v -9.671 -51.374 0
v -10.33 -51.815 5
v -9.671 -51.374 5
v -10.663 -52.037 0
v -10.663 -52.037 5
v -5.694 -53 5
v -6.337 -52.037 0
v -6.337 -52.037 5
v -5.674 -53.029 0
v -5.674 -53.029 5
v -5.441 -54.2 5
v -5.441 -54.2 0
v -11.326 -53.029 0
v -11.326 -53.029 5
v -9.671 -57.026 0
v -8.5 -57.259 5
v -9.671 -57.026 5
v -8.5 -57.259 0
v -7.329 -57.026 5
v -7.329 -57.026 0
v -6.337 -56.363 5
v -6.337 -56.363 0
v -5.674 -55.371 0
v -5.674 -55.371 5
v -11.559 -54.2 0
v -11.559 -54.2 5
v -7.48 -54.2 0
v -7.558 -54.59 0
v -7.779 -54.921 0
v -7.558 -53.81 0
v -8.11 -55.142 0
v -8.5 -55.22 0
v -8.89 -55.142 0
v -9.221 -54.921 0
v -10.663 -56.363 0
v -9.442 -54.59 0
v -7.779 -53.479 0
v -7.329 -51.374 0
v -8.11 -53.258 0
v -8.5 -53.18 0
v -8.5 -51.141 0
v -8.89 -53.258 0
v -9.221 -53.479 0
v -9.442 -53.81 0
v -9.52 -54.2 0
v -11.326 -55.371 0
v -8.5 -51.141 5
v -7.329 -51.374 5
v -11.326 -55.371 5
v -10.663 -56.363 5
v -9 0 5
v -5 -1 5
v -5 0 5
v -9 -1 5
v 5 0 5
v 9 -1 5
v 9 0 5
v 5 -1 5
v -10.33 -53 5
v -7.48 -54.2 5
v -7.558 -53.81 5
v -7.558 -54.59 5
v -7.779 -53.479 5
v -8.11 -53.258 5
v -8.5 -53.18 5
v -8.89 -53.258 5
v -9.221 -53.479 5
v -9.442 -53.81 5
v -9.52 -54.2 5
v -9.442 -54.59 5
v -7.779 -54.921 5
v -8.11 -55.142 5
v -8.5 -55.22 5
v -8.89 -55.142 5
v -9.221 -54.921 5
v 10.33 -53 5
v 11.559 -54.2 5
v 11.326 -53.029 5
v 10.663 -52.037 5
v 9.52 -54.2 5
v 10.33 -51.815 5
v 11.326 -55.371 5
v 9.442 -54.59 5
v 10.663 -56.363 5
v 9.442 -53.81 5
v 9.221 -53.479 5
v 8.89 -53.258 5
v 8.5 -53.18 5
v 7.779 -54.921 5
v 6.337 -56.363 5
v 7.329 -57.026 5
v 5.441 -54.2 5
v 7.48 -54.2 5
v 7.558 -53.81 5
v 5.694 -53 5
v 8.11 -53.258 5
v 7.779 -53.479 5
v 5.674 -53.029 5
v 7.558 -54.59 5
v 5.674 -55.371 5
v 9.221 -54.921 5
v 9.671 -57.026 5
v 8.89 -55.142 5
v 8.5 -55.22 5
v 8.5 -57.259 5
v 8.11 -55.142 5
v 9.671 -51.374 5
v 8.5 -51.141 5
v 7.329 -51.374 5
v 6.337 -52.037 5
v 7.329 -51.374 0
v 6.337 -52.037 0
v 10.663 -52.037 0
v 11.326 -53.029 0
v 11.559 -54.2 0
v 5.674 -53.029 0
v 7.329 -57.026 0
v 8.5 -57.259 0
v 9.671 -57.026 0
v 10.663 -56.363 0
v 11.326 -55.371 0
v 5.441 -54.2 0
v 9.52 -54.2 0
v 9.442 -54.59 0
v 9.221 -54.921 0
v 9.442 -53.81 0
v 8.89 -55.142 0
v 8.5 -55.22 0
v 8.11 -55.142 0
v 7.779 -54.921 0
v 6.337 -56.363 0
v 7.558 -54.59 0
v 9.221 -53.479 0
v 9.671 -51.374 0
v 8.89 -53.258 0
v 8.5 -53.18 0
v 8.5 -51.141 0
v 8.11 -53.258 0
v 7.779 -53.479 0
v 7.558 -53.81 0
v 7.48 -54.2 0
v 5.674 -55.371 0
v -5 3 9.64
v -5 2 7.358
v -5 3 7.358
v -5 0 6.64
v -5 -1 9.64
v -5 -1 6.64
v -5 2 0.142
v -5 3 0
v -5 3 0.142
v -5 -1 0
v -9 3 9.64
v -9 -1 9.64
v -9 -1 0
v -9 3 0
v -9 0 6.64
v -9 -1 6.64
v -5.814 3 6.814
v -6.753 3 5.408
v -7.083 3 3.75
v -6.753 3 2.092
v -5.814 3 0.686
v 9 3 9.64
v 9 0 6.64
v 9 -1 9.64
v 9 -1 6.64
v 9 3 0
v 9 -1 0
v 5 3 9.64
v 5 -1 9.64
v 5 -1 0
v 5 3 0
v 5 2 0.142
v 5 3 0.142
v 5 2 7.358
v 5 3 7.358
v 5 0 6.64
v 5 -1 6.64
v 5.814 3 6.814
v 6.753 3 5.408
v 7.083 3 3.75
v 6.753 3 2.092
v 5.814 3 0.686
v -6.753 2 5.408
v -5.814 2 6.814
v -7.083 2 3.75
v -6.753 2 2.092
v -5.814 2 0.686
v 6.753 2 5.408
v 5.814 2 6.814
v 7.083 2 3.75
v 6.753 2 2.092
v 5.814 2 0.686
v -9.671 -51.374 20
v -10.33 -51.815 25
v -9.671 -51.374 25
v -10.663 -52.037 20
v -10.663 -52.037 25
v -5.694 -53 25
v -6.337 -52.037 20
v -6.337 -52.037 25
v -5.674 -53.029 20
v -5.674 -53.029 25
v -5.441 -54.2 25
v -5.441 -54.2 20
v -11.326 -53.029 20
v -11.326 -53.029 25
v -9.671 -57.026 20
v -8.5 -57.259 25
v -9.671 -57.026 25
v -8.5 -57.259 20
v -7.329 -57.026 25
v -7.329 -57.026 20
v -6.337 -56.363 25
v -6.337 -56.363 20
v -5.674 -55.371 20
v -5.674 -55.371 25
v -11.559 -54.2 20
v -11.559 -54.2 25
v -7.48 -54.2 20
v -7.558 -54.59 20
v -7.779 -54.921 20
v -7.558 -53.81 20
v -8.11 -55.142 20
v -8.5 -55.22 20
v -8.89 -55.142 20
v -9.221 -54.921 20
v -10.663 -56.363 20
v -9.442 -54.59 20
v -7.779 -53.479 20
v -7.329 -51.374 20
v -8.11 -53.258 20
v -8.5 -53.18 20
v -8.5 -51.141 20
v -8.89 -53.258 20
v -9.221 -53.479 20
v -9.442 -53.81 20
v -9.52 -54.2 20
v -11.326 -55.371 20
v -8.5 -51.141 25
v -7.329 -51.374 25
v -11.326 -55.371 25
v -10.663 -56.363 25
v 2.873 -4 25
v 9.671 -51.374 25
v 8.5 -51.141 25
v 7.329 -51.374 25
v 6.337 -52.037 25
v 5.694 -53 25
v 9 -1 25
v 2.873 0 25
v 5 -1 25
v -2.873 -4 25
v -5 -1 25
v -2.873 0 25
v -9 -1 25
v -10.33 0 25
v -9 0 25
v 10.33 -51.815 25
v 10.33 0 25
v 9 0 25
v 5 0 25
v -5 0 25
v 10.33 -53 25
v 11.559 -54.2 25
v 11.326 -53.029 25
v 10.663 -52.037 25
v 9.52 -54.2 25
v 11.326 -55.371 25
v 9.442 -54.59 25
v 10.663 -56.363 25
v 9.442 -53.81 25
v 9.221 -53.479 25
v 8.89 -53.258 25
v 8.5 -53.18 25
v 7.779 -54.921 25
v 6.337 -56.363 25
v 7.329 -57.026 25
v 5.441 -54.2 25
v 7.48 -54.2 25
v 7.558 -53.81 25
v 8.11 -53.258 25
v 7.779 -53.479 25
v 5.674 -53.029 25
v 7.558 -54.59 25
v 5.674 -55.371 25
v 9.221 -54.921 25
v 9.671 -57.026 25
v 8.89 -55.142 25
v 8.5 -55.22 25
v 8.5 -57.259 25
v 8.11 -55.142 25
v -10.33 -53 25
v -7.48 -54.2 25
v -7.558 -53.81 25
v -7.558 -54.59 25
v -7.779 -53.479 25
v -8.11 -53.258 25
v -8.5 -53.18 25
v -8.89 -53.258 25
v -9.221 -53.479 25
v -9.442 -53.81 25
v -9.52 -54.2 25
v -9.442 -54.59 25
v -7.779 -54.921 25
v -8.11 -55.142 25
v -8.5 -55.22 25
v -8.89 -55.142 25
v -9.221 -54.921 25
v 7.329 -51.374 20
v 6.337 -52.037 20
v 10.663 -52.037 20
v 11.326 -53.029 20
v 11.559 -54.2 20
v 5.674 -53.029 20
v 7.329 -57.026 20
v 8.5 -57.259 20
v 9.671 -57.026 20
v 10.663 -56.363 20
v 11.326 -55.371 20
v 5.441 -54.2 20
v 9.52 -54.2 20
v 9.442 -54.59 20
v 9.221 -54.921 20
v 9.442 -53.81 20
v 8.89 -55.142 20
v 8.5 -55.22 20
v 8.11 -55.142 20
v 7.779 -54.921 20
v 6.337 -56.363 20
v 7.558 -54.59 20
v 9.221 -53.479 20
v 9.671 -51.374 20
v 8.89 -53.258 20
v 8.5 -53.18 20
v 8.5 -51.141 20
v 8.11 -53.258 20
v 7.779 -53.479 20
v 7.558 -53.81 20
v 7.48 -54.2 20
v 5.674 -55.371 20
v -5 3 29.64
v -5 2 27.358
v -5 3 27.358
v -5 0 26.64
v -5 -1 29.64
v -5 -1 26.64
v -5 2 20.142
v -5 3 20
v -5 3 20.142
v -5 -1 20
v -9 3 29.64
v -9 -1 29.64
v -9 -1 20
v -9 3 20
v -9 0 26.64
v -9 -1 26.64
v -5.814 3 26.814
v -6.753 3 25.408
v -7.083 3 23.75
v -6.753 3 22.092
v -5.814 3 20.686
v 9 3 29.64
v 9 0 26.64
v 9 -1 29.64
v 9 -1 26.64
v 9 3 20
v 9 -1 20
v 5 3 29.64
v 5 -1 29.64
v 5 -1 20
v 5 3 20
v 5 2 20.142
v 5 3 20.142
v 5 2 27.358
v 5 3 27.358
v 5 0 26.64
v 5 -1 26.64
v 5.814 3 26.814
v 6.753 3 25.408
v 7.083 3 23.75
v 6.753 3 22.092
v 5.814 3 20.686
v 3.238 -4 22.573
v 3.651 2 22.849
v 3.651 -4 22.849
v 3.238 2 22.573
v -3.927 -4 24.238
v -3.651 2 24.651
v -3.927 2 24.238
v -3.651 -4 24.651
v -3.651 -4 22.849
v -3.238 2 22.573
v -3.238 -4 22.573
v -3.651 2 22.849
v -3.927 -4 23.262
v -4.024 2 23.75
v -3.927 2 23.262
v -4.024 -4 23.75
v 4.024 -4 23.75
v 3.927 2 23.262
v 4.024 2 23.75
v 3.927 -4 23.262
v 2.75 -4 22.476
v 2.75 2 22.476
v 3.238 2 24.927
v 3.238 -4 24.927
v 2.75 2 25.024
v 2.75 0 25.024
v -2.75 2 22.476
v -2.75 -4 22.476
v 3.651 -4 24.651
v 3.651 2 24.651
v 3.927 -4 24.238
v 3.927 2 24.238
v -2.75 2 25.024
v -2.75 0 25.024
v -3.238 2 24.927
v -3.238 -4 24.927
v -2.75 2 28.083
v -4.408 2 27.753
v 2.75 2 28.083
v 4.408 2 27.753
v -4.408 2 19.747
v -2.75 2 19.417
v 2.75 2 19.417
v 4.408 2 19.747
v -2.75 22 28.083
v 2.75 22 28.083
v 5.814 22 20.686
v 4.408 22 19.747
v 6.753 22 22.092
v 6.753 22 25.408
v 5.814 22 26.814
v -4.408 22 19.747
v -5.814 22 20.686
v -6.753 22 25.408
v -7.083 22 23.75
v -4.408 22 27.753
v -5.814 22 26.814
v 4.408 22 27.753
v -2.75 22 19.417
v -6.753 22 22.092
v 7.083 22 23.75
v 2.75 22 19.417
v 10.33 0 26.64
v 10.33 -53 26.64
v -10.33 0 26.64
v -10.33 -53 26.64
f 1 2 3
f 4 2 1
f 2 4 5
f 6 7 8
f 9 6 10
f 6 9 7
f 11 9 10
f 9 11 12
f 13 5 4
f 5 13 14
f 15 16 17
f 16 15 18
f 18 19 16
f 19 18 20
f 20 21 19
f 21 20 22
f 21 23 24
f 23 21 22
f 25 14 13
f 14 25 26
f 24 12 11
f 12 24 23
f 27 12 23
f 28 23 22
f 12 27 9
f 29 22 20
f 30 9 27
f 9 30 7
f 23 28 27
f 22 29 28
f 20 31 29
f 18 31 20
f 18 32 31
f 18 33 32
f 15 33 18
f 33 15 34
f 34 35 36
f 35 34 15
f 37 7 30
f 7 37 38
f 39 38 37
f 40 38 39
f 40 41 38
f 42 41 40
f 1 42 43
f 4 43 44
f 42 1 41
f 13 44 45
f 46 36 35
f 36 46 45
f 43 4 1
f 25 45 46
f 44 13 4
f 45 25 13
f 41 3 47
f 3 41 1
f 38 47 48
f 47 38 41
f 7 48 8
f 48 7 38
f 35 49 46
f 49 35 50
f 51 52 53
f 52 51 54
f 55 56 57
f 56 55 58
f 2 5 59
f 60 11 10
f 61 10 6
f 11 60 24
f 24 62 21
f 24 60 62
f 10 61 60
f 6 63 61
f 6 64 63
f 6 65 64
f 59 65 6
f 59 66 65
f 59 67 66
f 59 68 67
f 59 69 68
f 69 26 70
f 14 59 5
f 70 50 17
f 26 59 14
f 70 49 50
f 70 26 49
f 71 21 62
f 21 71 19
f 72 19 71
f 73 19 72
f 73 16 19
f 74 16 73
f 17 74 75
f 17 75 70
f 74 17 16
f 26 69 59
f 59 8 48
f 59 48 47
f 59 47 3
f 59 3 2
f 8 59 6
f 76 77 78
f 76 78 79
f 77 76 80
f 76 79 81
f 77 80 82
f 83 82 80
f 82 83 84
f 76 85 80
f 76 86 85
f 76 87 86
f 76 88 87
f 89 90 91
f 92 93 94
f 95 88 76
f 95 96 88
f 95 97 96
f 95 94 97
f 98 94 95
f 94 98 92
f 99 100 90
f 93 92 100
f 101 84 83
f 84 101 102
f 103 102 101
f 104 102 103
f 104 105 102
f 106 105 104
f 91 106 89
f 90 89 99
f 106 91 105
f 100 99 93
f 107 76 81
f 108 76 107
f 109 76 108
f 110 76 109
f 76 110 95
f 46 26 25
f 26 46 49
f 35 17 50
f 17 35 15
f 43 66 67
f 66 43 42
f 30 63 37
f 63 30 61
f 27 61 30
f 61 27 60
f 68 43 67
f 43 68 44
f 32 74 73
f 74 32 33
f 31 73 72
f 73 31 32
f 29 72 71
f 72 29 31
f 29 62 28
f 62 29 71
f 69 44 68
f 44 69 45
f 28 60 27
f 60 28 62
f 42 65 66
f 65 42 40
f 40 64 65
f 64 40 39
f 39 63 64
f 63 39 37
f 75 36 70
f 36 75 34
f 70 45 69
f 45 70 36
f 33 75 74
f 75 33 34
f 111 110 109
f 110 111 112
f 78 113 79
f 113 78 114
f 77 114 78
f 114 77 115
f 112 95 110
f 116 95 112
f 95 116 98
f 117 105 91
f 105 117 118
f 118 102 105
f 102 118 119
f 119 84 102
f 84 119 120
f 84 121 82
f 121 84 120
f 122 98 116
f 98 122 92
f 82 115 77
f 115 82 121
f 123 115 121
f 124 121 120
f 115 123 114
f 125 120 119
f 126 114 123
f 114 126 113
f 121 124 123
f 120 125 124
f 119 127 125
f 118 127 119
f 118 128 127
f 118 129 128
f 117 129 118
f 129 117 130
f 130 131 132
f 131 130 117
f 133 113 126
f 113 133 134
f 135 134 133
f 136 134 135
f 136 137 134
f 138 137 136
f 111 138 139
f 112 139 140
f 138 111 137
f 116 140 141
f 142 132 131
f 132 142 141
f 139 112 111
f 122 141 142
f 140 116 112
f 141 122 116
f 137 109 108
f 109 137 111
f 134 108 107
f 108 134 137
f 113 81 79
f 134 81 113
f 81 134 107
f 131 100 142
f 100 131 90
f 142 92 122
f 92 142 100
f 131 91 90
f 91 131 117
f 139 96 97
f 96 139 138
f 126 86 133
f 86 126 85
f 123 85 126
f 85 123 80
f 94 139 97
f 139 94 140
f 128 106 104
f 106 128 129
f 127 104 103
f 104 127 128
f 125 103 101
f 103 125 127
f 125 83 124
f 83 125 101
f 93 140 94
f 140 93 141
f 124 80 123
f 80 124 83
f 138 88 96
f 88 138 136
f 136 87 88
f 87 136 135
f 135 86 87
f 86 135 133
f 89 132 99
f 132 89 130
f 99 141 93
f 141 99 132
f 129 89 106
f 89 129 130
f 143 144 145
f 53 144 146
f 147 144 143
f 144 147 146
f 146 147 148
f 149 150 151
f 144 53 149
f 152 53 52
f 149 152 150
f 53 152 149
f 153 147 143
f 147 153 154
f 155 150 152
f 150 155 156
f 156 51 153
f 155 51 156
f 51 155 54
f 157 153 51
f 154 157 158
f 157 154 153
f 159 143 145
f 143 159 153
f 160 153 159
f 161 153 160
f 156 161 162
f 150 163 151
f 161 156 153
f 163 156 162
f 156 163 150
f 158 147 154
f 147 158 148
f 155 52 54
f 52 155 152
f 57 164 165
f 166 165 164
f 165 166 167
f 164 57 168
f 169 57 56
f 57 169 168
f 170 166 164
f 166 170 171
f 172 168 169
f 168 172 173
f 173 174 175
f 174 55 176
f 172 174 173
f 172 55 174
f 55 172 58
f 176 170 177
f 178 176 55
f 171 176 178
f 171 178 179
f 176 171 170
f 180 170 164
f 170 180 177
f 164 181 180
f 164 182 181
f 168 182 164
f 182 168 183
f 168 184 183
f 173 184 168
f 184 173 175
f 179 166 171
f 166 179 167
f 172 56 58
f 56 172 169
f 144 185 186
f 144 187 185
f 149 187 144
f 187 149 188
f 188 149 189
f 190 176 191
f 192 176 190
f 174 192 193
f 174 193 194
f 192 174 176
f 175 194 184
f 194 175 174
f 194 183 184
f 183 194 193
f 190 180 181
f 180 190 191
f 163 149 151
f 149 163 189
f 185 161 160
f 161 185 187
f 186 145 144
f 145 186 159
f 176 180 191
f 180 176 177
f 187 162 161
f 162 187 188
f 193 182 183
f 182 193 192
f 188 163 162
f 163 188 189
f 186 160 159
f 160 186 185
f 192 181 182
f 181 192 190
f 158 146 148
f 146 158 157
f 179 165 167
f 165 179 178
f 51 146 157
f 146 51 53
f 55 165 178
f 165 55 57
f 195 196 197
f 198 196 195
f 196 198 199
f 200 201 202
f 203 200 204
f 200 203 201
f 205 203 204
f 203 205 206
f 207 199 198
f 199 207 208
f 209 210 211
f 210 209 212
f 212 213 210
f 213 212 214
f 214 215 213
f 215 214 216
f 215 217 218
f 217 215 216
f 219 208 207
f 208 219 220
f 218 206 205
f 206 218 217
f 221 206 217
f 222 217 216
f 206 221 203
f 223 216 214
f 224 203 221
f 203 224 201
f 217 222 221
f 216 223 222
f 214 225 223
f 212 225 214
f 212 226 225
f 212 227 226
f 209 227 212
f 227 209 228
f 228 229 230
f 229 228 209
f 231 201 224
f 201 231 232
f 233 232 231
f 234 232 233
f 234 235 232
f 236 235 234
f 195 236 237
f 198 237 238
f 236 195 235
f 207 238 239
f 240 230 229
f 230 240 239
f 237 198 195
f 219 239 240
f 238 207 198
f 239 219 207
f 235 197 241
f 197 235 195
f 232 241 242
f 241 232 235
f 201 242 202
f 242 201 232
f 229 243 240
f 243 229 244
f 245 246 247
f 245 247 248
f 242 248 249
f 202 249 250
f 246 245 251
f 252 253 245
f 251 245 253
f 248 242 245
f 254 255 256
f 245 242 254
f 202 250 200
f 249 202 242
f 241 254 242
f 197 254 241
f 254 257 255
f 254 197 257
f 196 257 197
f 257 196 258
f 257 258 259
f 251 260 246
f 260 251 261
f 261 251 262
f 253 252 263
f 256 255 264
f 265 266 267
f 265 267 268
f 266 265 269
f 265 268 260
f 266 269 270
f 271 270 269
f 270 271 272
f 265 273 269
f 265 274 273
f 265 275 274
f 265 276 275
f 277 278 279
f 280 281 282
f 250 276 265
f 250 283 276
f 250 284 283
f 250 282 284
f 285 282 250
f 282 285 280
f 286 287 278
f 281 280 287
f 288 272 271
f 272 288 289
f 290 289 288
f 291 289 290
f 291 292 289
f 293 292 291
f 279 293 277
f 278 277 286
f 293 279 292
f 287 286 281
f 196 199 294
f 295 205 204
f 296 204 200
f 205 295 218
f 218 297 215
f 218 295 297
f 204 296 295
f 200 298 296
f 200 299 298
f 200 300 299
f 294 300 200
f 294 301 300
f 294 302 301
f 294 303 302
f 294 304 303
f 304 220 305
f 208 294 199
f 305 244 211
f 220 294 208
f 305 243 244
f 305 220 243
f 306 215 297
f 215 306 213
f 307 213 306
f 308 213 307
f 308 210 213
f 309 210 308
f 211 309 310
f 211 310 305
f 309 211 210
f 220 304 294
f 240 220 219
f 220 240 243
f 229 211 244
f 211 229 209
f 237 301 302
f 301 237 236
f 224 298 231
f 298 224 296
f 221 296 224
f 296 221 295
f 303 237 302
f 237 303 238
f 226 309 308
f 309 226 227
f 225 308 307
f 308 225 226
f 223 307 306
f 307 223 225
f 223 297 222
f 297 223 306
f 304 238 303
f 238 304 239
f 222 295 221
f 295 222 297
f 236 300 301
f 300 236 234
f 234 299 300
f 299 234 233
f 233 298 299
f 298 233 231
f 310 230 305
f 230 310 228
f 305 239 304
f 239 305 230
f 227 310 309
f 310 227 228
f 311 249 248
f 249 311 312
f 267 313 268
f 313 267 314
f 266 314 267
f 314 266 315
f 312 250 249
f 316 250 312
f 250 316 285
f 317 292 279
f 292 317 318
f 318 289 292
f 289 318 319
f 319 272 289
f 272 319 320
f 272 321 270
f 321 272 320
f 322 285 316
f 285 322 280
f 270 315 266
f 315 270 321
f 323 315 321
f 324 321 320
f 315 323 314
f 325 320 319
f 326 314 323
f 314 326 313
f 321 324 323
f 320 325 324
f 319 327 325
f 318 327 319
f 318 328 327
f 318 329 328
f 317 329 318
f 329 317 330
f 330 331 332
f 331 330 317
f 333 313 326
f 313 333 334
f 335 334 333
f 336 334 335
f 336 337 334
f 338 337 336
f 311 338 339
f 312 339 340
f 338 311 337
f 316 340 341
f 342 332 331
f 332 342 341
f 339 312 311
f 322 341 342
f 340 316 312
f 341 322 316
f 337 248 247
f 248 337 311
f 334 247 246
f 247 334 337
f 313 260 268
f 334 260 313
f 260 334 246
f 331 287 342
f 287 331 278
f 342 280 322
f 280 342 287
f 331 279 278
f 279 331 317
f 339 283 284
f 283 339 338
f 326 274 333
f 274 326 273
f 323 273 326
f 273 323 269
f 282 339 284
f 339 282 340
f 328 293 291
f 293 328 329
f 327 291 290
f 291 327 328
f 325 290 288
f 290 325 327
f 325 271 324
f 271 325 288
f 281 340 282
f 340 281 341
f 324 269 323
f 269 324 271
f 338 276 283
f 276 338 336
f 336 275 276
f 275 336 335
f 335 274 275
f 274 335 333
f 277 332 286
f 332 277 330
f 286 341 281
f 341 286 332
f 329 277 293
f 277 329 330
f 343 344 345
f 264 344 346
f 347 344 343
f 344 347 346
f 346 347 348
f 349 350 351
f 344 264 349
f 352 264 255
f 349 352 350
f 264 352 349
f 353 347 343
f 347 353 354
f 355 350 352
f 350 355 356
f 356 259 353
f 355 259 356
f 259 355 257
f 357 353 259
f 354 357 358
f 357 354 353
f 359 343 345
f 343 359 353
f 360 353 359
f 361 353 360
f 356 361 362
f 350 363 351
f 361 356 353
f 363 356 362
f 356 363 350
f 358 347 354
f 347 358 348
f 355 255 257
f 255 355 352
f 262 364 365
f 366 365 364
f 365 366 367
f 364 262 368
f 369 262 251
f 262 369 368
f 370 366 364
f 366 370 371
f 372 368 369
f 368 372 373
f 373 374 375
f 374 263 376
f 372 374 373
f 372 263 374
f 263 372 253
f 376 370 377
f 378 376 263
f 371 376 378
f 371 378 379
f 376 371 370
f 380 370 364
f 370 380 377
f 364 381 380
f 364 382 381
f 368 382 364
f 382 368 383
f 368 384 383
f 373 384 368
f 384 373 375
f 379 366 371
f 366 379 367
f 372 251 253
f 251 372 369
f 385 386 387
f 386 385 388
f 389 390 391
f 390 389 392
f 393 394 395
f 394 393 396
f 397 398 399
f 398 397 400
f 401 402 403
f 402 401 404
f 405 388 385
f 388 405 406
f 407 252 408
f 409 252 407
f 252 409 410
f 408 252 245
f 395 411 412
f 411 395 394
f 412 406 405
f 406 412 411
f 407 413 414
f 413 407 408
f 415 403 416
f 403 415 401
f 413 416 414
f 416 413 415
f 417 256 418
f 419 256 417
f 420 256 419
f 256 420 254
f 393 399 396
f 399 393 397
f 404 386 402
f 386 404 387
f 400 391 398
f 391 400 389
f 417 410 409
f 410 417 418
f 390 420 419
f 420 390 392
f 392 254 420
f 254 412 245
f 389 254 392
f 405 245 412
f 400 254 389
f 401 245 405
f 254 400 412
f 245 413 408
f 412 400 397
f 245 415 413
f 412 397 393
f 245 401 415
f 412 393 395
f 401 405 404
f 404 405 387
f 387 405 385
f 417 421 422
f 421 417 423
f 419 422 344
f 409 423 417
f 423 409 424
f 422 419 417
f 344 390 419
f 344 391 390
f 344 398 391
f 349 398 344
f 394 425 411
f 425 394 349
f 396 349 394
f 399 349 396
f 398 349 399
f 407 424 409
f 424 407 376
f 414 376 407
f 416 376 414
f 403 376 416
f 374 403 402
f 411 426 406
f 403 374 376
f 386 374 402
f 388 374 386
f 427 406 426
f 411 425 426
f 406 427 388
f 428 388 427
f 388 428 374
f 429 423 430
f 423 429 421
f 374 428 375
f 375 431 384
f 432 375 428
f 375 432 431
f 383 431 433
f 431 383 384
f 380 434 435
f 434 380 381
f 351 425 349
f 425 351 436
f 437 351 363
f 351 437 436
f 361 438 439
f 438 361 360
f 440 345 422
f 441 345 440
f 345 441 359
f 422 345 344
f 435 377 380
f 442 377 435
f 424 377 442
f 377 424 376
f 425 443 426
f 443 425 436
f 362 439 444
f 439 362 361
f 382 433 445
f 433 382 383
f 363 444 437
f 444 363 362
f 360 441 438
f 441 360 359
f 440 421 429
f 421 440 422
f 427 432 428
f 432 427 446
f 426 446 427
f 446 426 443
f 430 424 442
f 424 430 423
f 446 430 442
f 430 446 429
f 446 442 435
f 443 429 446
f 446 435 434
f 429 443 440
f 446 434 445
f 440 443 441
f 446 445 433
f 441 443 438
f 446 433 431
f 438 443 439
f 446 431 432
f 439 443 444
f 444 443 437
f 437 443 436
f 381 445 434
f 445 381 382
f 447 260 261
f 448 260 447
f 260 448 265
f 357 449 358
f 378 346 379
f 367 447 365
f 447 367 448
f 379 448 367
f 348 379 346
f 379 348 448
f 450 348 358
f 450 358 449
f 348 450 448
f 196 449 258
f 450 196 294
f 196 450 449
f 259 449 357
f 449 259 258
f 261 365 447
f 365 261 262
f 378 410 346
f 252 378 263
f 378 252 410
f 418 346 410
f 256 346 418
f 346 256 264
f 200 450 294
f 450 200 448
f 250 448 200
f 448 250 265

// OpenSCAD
union() {
	color(alpha = 1.0, c = [0.2, 0.2, 0.2]) {
		difference() {
			union() {
				translate(v = [0, -54.2, 0]) {
					union() {
						translate(v = [-8.5, 0, 0]) {
							difference() {
								cylinder($fn = 16, center = false, h = 5, r = 3.058773474624955);
								translate(v = [0, 0, -0.05]) {
									cylinder($fn = 16, center = false, h = 5.1, r = 1.0195911582083184);
								}
							}
						}
						translate(v = [8.5, 0, 0]) {
							difference() {
								cylinder($fn = 16, center = false, h = 5, r = 3.058773474624955);
								translate(v = [0, 0, -0.05]) {
									cylinder($fn = 16, center = false, h = 5.1, r = 1.0195911582083184);
								}
							}
						}
					}
				}
				difference() {
					union() {
						translate(v = [-7.0, 0, 0]) {
							translate(v = [0, 1, 0]) {
								translate(v = [0, 0, 4.82]) {
									cube(center = true, size = [4, 4, 9.64]);
								}
							}
						}
						translate(v = [7.0, 0, 0]) {
							translate(v = [0, 1, 0]) {
								translate(v = [0, 0, 4.82]) {
									cube(center = true, size = [4, 4, 9.64]);
								}
							}
						}
					}
					union() {
						translate(v = [0, 0, 5.82]) {
							translate(v = [0, -26.5, 0]) {
								cube(center = true, size = [20.66, 53, 1.64]);
							}
						}
						translate(v = [0, 0, 3.75]) {
							union() {
								translate(v = [0, 2, 0]) {
									rotate(a = [90, 0, 0]) {
										hull() {
											translate(v = [-2.75, 0, 0]) {
												cylinder($fn = 16, center = false, h = 6, r = 1.274488947760398);
											}
											translate(v = [2.75, 0, 0]) {
												cylinder($fn = 16, center = false, h = 6, r = 1.274488947760398);
											}
										}
									}
								}
								translate(v = [0, 22, 0]) {
									rotate(a = [90, 0, 0]) {
										hull() {
											translate(v = [-2.75, 0, 0]) {
												cylinder($fn = 16, center = false, h = 20, r = 4.333262422385353);
											}
											translate(v = [2.75, 0, 0]) {
												cylinder($fn = 16, center = false, h = 20, r = 4.333262422385353);
											}
										}
									}
								}
							}
						}
					}
				}
			}
			union() {
				translate(v = [0, 0, 5.82]) {
					translate(v = [0, -26.5, 0]) {
						cube(center = true, size = [20.66, 53, 1.64]);
					}
				}
				translate(v = [0, 0, 3.75]) {
					union() {
						translate(v = [0, 2, 0]) {
							rotate(a = [90, 0, 0]) {
								hull() {
									translate(v = [-2.75, 0, 0]) {
										cylinder($fn = 16, center = false, h = 6, r = 1.274488947760398);
									}
									translate(v = [2.75, 0, 0]) {
										cylinder($fn = 16, center = false, h = 6, r = 1.274488947760398);
									}
								}
							}
						}
						translate(v = [0, 22, 0]) {
							rotate(a = [90, 0, 0]) {
								hull() {
									translate(v = [-2.75, 0, 0]) {
										cylinder($fn = 16, center = false, h = 20, r = 4.333262422385353);
									}
									translate(v = [2.75, 0, 0]) {
										cylinder($fn = 16, center = false, h = 20, r = 4.333262422385353);
									}
								}
							}
						}
					}
				}
			}
		}
	}
	translate(v = [0, 0, 20]) {
		union() {
			color(alpha = 1.0, c = [0.2, 0.2, 0.2]) {
				difference() {
					union() {
						translate(v = [0, -54.2, 0]) {
							union() {
								translate(v = [-8.5, 0, 0]) {
									difference() {
										cylinder($fn = 16, center = false, h = 5, r = 3.058773474624955);
										translate(v = [0, 0, -0.05]) {
											cylinder($fn = 16, center = false, h = 5.1, r = 1.0195911582083184);
										}
									}
								}
								translate(v = [8.5, 0, 0]) {
									difference() {
										cylinder($fn = 16, center = false, h = 5, r = 3.058773474624955);
										translate(v = [0, 0, -0.05]) {
											cylinder($fn = 16, center = false, h = 5.1, r = 1.0195911582083184);
										}
									}
								}
							}
						}
						difference() {
							union() {
								translate(v = [-7.0, 0, 0]) {
									translate(v = [0, 1, 0]) {
										translate(v = [0, 0, 4.82]) {
											cube(center = true, size = [4, 4, 9.64]);
										}
									}
								}
								translate(v = [7.0, 0, 0]) {
									translate(v = [0, 1, 0]) {
										translate(v = [0, 0, 4.82]) {
											cube(center = true, size = [4, 4, 9.64]);
										}
									}
								}
							}
							union() {
								translate(v = [0, 0, 5.82]) {
									translate(v = [0, -26.5, 0]) {
										cube(center = true, size = [20.66, 53, 1.64]);
									}
								}
								translate(v = [0, 0, 3.75]) {
									union() {
										translate(v = [0, 2, 0]) {
											rotate(a = [90, 0, 0]) {
												hull() {
													translate(v = [-2.75, 0, 0]) {
														cylinder($fn = 16, center = false, h = 6, r = 1.274488947760398);
													}
													translate(v = [2.75, 0, 0]) {
														cylinder($fn = 16, center = false, h = 6, r = 1.274488947760398);
													}
												}
											}
										}
										translate(v = [0, 22, 0]) {
											rotate(a = [90, 0, 0]) {
												hull() {
													translate(v = [-2.75, 0, 0]) {
														cylinder($fn = 16, center = false, h = 20, r = 4.333262422385353);
													}
													translate(v = [2.75, 0, 0]) {
														cylinder($fn = 16, center = false, h = 20, r = 4.333262422385353);
													}
												}
											}
										}
									}
								}
							}
						}
					}
					union() {
						translate(v = [0, 0, 5.82]) {
							translate(v = [0, -26.5, 0]) {
								cube(center = true, size = [20.66, 53, 1.64]);
							}
						}
						translate(v = [0, 0, 3.75]) {
							union() {
								translate(v = [0, 2, 0]) {
									rotate(a = [90, 0, 0]) {
										hull() {
											translate(v = [-2.75, 0, 0]) {
												cylinder($fn = 16, center = false, h = 6, r = 1.274488947760398);
											}
											translate(v = [2.75, 0, 0]) {
												cylinder($fn = 16, center = false, h = 6, r = 1.274488947760398);
											}
										}
									}
								}
								translate(v = [0, 22, 0]) {
									rotate(a = [90, 0, 0]) {
										hull() {
											translate(v = [-2.75, 0, 0]) {
												cylinder($fn = 16, center = false, h = 20, r = 4.333262422385353);
											}
											translate(v = [2.75, 0, 0]) {
												cylinder($fn = 16, center = false, h = 20, r = 4.333262422385353);
											}
										}
									}
								}
							}
						}
					}
				}
			}
			color(alpha = 1.0, c = [0.0, 0.4, 0.0]) {
				union() {
					translate(v = [0, 0, 5.82]) {
						translate(v = [0, -26.5, 0]) {
							cube(center = true, size = [20.66, 53, 1.64]);
						}
					}
					translate(v = [0, 0, 3.75]) {
						union() {
							translate(v = [0, 2, 0]) {
								rotate(a = [90, 0, 0]) {
									hull() {
										translate(v = [-2.75, 0, 0]) {
											cylinder($fn = 16, center = false, h = 6, r = 1.274488947760398);
										}
										translate(v = [2.75, 0, 0]) {
											cylinder($fn = 16, center = false, h = 6, r = 1.274488947760398);
										}
									}
								}
							}
							translate(v = [0, 22, 0]) {
								rotate(a = [90, 0, 0]) {
									hull() {
										translate(v = [-2.75, 0, 0]) {
											cylinder($fn = 16, center = false, h = 20, r = 4.333262422385353);
										}
										translate(v = [2.75, 0, 0]) {
											cylinder($fn = 16, center = false, h = 20, r = 4.333262422385353);
										}
									}
								}
							}
						}
					}
				}
			}
		}
	}
}
